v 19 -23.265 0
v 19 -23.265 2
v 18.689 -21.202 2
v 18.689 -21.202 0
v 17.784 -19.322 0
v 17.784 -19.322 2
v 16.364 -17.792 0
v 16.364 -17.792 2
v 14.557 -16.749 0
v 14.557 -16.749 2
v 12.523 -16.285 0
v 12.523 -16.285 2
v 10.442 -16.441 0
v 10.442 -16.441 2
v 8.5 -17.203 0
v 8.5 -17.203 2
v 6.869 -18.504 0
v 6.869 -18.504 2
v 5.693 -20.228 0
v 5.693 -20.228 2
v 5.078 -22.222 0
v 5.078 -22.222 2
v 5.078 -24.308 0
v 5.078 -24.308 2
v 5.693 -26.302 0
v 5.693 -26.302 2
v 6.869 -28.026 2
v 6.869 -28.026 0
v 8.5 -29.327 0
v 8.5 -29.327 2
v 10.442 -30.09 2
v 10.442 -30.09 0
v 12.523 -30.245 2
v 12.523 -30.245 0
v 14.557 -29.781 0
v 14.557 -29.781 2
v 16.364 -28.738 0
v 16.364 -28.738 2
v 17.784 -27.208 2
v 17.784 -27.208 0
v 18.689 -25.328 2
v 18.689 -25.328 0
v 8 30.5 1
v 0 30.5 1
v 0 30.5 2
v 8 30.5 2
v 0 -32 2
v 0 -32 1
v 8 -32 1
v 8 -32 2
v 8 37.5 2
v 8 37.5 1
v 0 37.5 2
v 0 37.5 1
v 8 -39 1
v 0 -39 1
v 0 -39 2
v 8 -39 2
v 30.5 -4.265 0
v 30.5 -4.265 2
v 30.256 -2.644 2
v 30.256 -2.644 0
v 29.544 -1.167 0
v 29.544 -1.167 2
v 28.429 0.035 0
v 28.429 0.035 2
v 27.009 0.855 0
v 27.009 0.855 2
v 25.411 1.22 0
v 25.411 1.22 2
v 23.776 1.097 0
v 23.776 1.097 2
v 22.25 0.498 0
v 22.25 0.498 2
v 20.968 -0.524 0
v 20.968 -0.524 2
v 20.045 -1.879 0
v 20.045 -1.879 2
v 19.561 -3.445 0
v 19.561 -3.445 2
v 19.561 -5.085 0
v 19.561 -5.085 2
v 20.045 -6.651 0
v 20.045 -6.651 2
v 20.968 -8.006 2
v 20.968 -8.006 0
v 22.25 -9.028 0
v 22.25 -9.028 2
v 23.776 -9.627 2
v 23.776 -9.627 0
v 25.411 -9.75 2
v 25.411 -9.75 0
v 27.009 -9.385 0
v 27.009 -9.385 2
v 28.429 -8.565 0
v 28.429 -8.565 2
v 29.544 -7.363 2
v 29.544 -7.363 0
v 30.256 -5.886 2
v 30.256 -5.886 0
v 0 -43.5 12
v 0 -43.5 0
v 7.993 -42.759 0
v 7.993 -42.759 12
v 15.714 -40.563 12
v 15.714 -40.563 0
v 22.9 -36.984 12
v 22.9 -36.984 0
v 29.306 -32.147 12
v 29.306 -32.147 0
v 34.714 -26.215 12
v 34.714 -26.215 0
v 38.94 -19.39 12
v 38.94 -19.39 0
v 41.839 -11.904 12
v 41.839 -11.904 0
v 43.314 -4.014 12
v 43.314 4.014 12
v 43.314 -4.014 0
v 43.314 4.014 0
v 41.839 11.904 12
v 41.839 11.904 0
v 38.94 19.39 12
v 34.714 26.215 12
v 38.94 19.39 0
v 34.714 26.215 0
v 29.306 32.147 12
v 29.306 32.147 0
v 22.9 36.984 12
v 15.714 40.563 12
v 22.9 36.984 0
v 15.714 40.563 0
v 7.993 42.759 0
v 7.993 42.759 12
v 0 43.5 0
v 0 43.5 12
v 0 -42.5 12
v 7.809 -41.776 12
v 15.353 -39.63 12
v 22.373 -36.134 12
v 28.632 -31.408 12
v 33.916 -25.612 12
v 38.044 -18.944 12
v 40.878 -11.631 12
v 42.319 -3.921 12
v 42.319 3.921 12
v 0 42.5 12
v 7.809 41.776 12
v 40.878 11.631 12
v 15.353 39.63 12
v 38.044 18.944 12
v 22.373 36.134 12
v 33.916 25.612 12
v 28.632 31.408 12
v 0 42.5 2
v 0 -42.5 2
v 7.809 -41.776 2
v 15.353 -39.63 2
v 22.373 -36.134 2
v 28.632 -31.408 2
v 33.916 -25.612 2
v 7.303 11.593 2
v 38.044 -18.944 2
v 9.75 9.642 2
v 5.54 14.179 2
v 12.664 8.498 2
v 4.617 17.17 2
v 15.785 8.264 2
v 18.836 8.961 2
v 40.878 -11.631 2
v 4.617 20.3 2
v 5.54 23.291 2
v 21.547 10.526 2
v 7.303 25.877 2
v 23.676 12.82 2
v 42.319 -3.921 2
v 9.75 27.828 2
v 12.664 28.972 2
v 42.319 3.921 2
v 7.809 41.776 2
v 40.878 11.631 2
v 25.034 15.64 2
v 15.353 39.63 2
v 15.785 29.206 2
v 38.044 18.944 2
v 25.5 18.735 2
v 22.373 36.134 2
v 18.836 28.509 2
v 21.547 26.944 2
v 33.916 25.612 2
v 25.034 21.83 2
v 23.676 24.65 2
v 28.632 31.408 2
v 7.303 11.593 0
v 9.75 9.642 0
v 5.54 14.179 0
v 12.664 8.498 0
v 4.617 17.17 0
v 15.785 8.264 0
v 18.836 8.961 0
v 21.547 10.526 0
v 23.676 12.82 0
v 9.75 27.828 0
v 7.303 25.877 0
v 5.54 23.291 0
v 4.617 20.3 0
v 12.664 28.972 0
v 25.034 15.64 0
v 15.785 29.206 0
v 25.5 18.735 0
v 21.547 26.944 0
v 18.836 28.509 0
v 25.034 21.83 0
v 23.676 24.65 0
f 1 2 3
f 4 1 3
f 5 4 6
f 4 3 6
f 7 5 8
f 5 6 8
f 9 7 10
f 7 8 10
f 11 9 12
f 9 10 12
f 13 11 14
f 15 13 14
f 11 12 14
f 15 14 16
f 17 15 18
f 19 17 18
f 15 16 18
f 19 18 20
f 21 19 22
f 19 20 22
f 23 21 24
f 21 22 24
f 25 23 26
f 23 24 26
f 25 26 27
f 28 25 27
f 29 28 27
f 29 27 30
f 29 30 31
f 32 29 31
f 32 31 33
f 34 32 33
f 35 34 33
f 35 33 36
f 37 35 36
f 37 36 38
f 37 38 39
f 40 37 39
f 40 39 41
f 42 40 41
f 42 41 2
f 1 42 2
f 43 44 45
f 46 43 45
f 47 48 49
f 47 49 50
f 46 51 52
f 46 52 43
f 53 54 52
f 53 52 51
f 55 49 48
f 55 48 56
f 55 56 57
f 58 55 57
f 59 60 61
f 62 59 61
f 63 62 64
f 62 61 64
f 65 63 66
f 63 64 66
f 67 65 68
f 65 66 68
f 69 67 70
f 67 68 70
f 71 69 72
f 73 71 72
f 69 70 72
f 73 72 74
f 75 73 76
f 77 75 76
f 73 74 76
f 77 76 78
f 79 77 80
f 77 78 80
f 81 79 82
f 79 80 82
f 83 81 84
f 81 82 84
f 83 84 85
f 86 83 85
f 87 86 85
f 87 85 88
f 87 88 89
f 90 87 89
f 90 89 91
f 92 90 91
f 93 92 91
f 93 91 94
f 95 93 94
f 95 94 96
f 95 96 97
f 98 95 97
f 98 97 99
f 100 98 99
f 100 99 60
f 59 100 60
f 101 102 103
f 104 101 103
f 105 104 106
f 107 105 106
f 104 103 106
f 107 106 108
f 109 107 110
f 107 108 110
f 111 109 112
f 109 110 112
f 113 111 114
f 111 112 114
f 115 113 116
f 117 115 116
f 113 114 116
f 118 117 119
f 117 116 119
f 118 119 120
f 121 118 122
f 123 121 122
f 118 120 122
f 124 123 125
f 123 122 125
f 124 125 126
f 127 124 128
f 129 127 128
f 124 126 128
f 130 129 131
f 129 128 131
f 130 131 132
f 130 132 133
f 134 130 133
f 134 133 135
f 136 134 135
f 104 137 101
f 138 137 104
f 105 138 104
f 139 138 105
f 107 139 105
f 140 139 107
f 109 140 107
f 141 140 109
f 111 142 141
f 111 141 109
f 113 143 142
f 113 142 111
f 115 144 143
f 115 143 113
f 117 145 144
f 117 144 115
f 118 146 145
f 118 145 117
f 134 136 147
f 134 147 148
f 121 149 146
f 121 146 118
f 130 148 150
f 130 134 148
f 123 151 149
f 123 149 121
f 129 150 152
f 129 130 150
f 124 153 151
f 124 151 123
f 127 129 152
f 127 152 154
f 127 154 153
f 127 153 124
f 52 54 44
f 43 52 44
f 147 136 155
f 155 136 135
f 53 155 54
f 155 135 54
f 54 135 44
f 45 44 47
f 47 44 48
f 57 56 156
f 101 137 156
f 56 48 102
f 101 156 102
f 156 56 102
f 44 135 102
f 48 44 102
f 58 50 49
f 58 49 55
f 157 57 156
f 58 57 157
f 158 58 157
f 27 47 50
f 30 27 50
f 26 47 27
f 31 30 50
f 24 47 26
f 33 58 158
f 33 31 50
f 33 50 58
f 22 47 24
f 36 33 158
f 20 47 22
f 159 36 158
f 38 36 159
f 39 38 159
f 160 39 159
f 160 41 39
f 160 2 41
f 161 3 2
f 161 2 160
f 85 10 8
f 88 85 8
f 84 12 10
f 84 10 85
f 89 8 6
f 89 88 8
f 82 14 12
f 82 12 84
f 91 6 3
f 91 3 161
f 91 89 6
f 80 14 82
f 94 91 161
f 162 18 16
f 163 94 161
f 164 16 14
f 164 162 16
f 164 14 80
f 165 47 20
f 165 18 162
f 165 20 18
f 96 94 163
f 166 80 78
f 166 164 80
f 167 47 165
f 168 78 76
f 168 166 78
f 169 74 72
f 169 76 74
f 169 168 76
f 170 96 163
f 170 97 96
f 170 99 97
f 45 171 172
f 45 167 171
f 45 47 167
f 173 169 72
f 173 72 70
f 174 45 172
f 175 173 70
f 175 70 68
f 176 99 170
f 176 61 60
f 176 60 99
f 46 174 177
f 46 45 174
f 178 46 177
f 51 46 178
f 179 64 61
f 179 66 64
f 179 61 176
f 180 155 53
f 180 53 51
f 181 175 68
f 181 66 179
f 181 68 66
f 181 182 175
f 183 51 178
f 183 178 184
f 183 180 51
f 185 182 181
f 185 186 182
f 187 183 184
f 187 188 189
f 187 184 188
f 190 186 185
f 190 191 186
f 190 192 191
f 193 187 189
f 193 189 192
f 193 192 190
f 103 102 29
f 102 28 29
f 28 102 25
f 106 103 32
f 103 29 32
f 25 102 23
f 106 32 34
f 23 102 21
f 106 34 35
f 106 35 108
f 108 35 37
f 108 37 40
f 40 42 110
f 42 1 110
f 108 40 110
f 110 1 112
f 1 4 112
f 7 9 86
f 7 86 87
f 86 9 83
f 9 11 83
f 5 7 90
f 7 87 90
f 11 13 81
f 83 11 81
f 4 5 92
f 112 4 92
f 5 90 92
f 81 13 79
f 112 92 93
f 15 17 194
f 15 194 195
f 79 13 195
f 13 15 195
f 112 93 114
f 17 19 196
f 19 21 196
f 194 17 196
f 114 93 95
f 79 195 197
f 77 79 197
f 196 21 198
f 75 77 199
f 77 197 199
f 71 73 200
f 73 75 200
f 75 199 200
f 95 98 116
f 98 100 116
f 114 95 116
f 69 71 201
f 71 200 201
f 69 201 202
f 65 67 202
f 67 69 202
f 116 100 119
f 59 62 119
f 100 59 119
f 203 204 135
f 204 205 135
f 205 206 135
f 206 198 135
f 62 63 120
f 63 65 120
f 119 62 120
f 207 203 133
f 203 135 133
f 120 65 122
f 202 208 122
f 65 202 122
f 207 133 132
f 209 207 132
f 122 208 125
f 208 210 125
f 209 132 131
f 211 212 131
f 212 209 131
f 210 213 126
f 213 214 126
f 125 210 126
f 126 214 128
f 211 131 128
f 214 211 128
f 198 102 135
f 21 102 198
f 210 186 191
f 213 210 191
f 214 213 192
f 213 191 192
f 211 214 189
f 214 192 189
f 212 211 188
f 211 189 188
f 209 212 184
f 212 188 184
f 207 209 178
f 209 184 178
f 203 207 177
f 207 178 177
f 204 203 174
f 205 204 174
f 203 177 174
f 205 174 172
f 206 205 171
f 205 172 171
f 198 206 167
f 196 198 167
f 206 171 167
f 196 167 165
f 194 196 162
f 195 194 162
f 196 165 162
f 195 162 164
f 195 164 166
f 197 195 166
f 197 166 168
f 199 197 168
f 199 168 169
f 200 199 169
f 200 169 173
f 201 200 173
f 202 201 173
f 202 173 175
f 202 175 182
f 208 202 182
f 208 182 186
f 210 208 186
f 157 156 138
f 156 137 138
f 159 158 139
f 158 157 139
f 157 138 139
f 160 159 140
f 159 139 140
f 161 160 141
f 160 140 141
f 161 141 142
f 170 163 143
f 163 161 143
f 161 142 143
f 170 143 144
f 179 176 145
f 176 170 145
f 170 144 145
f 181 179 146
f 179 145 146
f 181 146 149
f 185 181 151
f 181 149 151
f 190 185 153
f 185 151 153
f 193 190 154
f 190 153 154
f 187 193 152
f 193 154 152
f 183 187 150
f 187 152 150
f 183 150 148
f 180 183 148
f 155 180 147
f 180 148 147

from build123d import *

# Parameters (mm, degrees)
F1_DEPTH = 12
F2_R     = 42.5
F3_DEPTH = 10
F4_R     = 10.5
F4_R_2   = 5.5
F4_R_3   = 7
F5_DEPTH = 2.001
F6_W     = 7
F6_H     = 1
F7_DEPTH = 8


with BuildPart() as f1:
    # F0 (on Top) → F1 (new body)
    with BuildSketch(Plane.XY):
        with BuildLine():
            Line((0, 43.5), (0, -43.5))
            ThreePointArc((0, -43.5), (43.5, 0), (0, 43.5))
        make_face()
    extrude(amount=F1_DEPTH)

    # F2 (on face) → F3 (cut)
    with BuildSketch(Plane.XY.offset(12)):
        Circle(F2_R)
    extrude(amount=-F3_DEPTH, mode=Mode.SUBTRACT)

    # F4 (on face) → F5 (cut, through all)
    with BuildSketch(Plane.XY.offset(2)):
        with Locations((-15, 18.734994)):
            Circle(F4_R)
        with Locations((-25, -4.265006)):
            Circle(F4_R_2)
        with Locations((-12, -23.265006)):
            Circle(F4_R_3)
        with Locations((15, 18.734994)):
            Circle(F4_R)
        with Locations((25, -4.265006)):
            Circle(F4_R_2)
        with Locations((12, -23.265006)):
            Circle(F4_R_3)
    extrude(amount=-F5_DEPTH, mode=Mode.SUBTRACT)

    # F6 (on face) → F7 (cut)
    with BuildSketch(Plane(origin=(0, 0, 0), x_dir=(0, -1, 0), z_dir=(-1, 0, 0))):
        with Locations((-34, 1.5)):
            Rectangle(F6_W, F6_H)
        with Locations((35.5, 1.5)):
            Rectangle(F6_W, F6_H)
    extrude(amount=-F7_DEPTH, mode=Mode.SUBTRACT)


solid = f1.part
